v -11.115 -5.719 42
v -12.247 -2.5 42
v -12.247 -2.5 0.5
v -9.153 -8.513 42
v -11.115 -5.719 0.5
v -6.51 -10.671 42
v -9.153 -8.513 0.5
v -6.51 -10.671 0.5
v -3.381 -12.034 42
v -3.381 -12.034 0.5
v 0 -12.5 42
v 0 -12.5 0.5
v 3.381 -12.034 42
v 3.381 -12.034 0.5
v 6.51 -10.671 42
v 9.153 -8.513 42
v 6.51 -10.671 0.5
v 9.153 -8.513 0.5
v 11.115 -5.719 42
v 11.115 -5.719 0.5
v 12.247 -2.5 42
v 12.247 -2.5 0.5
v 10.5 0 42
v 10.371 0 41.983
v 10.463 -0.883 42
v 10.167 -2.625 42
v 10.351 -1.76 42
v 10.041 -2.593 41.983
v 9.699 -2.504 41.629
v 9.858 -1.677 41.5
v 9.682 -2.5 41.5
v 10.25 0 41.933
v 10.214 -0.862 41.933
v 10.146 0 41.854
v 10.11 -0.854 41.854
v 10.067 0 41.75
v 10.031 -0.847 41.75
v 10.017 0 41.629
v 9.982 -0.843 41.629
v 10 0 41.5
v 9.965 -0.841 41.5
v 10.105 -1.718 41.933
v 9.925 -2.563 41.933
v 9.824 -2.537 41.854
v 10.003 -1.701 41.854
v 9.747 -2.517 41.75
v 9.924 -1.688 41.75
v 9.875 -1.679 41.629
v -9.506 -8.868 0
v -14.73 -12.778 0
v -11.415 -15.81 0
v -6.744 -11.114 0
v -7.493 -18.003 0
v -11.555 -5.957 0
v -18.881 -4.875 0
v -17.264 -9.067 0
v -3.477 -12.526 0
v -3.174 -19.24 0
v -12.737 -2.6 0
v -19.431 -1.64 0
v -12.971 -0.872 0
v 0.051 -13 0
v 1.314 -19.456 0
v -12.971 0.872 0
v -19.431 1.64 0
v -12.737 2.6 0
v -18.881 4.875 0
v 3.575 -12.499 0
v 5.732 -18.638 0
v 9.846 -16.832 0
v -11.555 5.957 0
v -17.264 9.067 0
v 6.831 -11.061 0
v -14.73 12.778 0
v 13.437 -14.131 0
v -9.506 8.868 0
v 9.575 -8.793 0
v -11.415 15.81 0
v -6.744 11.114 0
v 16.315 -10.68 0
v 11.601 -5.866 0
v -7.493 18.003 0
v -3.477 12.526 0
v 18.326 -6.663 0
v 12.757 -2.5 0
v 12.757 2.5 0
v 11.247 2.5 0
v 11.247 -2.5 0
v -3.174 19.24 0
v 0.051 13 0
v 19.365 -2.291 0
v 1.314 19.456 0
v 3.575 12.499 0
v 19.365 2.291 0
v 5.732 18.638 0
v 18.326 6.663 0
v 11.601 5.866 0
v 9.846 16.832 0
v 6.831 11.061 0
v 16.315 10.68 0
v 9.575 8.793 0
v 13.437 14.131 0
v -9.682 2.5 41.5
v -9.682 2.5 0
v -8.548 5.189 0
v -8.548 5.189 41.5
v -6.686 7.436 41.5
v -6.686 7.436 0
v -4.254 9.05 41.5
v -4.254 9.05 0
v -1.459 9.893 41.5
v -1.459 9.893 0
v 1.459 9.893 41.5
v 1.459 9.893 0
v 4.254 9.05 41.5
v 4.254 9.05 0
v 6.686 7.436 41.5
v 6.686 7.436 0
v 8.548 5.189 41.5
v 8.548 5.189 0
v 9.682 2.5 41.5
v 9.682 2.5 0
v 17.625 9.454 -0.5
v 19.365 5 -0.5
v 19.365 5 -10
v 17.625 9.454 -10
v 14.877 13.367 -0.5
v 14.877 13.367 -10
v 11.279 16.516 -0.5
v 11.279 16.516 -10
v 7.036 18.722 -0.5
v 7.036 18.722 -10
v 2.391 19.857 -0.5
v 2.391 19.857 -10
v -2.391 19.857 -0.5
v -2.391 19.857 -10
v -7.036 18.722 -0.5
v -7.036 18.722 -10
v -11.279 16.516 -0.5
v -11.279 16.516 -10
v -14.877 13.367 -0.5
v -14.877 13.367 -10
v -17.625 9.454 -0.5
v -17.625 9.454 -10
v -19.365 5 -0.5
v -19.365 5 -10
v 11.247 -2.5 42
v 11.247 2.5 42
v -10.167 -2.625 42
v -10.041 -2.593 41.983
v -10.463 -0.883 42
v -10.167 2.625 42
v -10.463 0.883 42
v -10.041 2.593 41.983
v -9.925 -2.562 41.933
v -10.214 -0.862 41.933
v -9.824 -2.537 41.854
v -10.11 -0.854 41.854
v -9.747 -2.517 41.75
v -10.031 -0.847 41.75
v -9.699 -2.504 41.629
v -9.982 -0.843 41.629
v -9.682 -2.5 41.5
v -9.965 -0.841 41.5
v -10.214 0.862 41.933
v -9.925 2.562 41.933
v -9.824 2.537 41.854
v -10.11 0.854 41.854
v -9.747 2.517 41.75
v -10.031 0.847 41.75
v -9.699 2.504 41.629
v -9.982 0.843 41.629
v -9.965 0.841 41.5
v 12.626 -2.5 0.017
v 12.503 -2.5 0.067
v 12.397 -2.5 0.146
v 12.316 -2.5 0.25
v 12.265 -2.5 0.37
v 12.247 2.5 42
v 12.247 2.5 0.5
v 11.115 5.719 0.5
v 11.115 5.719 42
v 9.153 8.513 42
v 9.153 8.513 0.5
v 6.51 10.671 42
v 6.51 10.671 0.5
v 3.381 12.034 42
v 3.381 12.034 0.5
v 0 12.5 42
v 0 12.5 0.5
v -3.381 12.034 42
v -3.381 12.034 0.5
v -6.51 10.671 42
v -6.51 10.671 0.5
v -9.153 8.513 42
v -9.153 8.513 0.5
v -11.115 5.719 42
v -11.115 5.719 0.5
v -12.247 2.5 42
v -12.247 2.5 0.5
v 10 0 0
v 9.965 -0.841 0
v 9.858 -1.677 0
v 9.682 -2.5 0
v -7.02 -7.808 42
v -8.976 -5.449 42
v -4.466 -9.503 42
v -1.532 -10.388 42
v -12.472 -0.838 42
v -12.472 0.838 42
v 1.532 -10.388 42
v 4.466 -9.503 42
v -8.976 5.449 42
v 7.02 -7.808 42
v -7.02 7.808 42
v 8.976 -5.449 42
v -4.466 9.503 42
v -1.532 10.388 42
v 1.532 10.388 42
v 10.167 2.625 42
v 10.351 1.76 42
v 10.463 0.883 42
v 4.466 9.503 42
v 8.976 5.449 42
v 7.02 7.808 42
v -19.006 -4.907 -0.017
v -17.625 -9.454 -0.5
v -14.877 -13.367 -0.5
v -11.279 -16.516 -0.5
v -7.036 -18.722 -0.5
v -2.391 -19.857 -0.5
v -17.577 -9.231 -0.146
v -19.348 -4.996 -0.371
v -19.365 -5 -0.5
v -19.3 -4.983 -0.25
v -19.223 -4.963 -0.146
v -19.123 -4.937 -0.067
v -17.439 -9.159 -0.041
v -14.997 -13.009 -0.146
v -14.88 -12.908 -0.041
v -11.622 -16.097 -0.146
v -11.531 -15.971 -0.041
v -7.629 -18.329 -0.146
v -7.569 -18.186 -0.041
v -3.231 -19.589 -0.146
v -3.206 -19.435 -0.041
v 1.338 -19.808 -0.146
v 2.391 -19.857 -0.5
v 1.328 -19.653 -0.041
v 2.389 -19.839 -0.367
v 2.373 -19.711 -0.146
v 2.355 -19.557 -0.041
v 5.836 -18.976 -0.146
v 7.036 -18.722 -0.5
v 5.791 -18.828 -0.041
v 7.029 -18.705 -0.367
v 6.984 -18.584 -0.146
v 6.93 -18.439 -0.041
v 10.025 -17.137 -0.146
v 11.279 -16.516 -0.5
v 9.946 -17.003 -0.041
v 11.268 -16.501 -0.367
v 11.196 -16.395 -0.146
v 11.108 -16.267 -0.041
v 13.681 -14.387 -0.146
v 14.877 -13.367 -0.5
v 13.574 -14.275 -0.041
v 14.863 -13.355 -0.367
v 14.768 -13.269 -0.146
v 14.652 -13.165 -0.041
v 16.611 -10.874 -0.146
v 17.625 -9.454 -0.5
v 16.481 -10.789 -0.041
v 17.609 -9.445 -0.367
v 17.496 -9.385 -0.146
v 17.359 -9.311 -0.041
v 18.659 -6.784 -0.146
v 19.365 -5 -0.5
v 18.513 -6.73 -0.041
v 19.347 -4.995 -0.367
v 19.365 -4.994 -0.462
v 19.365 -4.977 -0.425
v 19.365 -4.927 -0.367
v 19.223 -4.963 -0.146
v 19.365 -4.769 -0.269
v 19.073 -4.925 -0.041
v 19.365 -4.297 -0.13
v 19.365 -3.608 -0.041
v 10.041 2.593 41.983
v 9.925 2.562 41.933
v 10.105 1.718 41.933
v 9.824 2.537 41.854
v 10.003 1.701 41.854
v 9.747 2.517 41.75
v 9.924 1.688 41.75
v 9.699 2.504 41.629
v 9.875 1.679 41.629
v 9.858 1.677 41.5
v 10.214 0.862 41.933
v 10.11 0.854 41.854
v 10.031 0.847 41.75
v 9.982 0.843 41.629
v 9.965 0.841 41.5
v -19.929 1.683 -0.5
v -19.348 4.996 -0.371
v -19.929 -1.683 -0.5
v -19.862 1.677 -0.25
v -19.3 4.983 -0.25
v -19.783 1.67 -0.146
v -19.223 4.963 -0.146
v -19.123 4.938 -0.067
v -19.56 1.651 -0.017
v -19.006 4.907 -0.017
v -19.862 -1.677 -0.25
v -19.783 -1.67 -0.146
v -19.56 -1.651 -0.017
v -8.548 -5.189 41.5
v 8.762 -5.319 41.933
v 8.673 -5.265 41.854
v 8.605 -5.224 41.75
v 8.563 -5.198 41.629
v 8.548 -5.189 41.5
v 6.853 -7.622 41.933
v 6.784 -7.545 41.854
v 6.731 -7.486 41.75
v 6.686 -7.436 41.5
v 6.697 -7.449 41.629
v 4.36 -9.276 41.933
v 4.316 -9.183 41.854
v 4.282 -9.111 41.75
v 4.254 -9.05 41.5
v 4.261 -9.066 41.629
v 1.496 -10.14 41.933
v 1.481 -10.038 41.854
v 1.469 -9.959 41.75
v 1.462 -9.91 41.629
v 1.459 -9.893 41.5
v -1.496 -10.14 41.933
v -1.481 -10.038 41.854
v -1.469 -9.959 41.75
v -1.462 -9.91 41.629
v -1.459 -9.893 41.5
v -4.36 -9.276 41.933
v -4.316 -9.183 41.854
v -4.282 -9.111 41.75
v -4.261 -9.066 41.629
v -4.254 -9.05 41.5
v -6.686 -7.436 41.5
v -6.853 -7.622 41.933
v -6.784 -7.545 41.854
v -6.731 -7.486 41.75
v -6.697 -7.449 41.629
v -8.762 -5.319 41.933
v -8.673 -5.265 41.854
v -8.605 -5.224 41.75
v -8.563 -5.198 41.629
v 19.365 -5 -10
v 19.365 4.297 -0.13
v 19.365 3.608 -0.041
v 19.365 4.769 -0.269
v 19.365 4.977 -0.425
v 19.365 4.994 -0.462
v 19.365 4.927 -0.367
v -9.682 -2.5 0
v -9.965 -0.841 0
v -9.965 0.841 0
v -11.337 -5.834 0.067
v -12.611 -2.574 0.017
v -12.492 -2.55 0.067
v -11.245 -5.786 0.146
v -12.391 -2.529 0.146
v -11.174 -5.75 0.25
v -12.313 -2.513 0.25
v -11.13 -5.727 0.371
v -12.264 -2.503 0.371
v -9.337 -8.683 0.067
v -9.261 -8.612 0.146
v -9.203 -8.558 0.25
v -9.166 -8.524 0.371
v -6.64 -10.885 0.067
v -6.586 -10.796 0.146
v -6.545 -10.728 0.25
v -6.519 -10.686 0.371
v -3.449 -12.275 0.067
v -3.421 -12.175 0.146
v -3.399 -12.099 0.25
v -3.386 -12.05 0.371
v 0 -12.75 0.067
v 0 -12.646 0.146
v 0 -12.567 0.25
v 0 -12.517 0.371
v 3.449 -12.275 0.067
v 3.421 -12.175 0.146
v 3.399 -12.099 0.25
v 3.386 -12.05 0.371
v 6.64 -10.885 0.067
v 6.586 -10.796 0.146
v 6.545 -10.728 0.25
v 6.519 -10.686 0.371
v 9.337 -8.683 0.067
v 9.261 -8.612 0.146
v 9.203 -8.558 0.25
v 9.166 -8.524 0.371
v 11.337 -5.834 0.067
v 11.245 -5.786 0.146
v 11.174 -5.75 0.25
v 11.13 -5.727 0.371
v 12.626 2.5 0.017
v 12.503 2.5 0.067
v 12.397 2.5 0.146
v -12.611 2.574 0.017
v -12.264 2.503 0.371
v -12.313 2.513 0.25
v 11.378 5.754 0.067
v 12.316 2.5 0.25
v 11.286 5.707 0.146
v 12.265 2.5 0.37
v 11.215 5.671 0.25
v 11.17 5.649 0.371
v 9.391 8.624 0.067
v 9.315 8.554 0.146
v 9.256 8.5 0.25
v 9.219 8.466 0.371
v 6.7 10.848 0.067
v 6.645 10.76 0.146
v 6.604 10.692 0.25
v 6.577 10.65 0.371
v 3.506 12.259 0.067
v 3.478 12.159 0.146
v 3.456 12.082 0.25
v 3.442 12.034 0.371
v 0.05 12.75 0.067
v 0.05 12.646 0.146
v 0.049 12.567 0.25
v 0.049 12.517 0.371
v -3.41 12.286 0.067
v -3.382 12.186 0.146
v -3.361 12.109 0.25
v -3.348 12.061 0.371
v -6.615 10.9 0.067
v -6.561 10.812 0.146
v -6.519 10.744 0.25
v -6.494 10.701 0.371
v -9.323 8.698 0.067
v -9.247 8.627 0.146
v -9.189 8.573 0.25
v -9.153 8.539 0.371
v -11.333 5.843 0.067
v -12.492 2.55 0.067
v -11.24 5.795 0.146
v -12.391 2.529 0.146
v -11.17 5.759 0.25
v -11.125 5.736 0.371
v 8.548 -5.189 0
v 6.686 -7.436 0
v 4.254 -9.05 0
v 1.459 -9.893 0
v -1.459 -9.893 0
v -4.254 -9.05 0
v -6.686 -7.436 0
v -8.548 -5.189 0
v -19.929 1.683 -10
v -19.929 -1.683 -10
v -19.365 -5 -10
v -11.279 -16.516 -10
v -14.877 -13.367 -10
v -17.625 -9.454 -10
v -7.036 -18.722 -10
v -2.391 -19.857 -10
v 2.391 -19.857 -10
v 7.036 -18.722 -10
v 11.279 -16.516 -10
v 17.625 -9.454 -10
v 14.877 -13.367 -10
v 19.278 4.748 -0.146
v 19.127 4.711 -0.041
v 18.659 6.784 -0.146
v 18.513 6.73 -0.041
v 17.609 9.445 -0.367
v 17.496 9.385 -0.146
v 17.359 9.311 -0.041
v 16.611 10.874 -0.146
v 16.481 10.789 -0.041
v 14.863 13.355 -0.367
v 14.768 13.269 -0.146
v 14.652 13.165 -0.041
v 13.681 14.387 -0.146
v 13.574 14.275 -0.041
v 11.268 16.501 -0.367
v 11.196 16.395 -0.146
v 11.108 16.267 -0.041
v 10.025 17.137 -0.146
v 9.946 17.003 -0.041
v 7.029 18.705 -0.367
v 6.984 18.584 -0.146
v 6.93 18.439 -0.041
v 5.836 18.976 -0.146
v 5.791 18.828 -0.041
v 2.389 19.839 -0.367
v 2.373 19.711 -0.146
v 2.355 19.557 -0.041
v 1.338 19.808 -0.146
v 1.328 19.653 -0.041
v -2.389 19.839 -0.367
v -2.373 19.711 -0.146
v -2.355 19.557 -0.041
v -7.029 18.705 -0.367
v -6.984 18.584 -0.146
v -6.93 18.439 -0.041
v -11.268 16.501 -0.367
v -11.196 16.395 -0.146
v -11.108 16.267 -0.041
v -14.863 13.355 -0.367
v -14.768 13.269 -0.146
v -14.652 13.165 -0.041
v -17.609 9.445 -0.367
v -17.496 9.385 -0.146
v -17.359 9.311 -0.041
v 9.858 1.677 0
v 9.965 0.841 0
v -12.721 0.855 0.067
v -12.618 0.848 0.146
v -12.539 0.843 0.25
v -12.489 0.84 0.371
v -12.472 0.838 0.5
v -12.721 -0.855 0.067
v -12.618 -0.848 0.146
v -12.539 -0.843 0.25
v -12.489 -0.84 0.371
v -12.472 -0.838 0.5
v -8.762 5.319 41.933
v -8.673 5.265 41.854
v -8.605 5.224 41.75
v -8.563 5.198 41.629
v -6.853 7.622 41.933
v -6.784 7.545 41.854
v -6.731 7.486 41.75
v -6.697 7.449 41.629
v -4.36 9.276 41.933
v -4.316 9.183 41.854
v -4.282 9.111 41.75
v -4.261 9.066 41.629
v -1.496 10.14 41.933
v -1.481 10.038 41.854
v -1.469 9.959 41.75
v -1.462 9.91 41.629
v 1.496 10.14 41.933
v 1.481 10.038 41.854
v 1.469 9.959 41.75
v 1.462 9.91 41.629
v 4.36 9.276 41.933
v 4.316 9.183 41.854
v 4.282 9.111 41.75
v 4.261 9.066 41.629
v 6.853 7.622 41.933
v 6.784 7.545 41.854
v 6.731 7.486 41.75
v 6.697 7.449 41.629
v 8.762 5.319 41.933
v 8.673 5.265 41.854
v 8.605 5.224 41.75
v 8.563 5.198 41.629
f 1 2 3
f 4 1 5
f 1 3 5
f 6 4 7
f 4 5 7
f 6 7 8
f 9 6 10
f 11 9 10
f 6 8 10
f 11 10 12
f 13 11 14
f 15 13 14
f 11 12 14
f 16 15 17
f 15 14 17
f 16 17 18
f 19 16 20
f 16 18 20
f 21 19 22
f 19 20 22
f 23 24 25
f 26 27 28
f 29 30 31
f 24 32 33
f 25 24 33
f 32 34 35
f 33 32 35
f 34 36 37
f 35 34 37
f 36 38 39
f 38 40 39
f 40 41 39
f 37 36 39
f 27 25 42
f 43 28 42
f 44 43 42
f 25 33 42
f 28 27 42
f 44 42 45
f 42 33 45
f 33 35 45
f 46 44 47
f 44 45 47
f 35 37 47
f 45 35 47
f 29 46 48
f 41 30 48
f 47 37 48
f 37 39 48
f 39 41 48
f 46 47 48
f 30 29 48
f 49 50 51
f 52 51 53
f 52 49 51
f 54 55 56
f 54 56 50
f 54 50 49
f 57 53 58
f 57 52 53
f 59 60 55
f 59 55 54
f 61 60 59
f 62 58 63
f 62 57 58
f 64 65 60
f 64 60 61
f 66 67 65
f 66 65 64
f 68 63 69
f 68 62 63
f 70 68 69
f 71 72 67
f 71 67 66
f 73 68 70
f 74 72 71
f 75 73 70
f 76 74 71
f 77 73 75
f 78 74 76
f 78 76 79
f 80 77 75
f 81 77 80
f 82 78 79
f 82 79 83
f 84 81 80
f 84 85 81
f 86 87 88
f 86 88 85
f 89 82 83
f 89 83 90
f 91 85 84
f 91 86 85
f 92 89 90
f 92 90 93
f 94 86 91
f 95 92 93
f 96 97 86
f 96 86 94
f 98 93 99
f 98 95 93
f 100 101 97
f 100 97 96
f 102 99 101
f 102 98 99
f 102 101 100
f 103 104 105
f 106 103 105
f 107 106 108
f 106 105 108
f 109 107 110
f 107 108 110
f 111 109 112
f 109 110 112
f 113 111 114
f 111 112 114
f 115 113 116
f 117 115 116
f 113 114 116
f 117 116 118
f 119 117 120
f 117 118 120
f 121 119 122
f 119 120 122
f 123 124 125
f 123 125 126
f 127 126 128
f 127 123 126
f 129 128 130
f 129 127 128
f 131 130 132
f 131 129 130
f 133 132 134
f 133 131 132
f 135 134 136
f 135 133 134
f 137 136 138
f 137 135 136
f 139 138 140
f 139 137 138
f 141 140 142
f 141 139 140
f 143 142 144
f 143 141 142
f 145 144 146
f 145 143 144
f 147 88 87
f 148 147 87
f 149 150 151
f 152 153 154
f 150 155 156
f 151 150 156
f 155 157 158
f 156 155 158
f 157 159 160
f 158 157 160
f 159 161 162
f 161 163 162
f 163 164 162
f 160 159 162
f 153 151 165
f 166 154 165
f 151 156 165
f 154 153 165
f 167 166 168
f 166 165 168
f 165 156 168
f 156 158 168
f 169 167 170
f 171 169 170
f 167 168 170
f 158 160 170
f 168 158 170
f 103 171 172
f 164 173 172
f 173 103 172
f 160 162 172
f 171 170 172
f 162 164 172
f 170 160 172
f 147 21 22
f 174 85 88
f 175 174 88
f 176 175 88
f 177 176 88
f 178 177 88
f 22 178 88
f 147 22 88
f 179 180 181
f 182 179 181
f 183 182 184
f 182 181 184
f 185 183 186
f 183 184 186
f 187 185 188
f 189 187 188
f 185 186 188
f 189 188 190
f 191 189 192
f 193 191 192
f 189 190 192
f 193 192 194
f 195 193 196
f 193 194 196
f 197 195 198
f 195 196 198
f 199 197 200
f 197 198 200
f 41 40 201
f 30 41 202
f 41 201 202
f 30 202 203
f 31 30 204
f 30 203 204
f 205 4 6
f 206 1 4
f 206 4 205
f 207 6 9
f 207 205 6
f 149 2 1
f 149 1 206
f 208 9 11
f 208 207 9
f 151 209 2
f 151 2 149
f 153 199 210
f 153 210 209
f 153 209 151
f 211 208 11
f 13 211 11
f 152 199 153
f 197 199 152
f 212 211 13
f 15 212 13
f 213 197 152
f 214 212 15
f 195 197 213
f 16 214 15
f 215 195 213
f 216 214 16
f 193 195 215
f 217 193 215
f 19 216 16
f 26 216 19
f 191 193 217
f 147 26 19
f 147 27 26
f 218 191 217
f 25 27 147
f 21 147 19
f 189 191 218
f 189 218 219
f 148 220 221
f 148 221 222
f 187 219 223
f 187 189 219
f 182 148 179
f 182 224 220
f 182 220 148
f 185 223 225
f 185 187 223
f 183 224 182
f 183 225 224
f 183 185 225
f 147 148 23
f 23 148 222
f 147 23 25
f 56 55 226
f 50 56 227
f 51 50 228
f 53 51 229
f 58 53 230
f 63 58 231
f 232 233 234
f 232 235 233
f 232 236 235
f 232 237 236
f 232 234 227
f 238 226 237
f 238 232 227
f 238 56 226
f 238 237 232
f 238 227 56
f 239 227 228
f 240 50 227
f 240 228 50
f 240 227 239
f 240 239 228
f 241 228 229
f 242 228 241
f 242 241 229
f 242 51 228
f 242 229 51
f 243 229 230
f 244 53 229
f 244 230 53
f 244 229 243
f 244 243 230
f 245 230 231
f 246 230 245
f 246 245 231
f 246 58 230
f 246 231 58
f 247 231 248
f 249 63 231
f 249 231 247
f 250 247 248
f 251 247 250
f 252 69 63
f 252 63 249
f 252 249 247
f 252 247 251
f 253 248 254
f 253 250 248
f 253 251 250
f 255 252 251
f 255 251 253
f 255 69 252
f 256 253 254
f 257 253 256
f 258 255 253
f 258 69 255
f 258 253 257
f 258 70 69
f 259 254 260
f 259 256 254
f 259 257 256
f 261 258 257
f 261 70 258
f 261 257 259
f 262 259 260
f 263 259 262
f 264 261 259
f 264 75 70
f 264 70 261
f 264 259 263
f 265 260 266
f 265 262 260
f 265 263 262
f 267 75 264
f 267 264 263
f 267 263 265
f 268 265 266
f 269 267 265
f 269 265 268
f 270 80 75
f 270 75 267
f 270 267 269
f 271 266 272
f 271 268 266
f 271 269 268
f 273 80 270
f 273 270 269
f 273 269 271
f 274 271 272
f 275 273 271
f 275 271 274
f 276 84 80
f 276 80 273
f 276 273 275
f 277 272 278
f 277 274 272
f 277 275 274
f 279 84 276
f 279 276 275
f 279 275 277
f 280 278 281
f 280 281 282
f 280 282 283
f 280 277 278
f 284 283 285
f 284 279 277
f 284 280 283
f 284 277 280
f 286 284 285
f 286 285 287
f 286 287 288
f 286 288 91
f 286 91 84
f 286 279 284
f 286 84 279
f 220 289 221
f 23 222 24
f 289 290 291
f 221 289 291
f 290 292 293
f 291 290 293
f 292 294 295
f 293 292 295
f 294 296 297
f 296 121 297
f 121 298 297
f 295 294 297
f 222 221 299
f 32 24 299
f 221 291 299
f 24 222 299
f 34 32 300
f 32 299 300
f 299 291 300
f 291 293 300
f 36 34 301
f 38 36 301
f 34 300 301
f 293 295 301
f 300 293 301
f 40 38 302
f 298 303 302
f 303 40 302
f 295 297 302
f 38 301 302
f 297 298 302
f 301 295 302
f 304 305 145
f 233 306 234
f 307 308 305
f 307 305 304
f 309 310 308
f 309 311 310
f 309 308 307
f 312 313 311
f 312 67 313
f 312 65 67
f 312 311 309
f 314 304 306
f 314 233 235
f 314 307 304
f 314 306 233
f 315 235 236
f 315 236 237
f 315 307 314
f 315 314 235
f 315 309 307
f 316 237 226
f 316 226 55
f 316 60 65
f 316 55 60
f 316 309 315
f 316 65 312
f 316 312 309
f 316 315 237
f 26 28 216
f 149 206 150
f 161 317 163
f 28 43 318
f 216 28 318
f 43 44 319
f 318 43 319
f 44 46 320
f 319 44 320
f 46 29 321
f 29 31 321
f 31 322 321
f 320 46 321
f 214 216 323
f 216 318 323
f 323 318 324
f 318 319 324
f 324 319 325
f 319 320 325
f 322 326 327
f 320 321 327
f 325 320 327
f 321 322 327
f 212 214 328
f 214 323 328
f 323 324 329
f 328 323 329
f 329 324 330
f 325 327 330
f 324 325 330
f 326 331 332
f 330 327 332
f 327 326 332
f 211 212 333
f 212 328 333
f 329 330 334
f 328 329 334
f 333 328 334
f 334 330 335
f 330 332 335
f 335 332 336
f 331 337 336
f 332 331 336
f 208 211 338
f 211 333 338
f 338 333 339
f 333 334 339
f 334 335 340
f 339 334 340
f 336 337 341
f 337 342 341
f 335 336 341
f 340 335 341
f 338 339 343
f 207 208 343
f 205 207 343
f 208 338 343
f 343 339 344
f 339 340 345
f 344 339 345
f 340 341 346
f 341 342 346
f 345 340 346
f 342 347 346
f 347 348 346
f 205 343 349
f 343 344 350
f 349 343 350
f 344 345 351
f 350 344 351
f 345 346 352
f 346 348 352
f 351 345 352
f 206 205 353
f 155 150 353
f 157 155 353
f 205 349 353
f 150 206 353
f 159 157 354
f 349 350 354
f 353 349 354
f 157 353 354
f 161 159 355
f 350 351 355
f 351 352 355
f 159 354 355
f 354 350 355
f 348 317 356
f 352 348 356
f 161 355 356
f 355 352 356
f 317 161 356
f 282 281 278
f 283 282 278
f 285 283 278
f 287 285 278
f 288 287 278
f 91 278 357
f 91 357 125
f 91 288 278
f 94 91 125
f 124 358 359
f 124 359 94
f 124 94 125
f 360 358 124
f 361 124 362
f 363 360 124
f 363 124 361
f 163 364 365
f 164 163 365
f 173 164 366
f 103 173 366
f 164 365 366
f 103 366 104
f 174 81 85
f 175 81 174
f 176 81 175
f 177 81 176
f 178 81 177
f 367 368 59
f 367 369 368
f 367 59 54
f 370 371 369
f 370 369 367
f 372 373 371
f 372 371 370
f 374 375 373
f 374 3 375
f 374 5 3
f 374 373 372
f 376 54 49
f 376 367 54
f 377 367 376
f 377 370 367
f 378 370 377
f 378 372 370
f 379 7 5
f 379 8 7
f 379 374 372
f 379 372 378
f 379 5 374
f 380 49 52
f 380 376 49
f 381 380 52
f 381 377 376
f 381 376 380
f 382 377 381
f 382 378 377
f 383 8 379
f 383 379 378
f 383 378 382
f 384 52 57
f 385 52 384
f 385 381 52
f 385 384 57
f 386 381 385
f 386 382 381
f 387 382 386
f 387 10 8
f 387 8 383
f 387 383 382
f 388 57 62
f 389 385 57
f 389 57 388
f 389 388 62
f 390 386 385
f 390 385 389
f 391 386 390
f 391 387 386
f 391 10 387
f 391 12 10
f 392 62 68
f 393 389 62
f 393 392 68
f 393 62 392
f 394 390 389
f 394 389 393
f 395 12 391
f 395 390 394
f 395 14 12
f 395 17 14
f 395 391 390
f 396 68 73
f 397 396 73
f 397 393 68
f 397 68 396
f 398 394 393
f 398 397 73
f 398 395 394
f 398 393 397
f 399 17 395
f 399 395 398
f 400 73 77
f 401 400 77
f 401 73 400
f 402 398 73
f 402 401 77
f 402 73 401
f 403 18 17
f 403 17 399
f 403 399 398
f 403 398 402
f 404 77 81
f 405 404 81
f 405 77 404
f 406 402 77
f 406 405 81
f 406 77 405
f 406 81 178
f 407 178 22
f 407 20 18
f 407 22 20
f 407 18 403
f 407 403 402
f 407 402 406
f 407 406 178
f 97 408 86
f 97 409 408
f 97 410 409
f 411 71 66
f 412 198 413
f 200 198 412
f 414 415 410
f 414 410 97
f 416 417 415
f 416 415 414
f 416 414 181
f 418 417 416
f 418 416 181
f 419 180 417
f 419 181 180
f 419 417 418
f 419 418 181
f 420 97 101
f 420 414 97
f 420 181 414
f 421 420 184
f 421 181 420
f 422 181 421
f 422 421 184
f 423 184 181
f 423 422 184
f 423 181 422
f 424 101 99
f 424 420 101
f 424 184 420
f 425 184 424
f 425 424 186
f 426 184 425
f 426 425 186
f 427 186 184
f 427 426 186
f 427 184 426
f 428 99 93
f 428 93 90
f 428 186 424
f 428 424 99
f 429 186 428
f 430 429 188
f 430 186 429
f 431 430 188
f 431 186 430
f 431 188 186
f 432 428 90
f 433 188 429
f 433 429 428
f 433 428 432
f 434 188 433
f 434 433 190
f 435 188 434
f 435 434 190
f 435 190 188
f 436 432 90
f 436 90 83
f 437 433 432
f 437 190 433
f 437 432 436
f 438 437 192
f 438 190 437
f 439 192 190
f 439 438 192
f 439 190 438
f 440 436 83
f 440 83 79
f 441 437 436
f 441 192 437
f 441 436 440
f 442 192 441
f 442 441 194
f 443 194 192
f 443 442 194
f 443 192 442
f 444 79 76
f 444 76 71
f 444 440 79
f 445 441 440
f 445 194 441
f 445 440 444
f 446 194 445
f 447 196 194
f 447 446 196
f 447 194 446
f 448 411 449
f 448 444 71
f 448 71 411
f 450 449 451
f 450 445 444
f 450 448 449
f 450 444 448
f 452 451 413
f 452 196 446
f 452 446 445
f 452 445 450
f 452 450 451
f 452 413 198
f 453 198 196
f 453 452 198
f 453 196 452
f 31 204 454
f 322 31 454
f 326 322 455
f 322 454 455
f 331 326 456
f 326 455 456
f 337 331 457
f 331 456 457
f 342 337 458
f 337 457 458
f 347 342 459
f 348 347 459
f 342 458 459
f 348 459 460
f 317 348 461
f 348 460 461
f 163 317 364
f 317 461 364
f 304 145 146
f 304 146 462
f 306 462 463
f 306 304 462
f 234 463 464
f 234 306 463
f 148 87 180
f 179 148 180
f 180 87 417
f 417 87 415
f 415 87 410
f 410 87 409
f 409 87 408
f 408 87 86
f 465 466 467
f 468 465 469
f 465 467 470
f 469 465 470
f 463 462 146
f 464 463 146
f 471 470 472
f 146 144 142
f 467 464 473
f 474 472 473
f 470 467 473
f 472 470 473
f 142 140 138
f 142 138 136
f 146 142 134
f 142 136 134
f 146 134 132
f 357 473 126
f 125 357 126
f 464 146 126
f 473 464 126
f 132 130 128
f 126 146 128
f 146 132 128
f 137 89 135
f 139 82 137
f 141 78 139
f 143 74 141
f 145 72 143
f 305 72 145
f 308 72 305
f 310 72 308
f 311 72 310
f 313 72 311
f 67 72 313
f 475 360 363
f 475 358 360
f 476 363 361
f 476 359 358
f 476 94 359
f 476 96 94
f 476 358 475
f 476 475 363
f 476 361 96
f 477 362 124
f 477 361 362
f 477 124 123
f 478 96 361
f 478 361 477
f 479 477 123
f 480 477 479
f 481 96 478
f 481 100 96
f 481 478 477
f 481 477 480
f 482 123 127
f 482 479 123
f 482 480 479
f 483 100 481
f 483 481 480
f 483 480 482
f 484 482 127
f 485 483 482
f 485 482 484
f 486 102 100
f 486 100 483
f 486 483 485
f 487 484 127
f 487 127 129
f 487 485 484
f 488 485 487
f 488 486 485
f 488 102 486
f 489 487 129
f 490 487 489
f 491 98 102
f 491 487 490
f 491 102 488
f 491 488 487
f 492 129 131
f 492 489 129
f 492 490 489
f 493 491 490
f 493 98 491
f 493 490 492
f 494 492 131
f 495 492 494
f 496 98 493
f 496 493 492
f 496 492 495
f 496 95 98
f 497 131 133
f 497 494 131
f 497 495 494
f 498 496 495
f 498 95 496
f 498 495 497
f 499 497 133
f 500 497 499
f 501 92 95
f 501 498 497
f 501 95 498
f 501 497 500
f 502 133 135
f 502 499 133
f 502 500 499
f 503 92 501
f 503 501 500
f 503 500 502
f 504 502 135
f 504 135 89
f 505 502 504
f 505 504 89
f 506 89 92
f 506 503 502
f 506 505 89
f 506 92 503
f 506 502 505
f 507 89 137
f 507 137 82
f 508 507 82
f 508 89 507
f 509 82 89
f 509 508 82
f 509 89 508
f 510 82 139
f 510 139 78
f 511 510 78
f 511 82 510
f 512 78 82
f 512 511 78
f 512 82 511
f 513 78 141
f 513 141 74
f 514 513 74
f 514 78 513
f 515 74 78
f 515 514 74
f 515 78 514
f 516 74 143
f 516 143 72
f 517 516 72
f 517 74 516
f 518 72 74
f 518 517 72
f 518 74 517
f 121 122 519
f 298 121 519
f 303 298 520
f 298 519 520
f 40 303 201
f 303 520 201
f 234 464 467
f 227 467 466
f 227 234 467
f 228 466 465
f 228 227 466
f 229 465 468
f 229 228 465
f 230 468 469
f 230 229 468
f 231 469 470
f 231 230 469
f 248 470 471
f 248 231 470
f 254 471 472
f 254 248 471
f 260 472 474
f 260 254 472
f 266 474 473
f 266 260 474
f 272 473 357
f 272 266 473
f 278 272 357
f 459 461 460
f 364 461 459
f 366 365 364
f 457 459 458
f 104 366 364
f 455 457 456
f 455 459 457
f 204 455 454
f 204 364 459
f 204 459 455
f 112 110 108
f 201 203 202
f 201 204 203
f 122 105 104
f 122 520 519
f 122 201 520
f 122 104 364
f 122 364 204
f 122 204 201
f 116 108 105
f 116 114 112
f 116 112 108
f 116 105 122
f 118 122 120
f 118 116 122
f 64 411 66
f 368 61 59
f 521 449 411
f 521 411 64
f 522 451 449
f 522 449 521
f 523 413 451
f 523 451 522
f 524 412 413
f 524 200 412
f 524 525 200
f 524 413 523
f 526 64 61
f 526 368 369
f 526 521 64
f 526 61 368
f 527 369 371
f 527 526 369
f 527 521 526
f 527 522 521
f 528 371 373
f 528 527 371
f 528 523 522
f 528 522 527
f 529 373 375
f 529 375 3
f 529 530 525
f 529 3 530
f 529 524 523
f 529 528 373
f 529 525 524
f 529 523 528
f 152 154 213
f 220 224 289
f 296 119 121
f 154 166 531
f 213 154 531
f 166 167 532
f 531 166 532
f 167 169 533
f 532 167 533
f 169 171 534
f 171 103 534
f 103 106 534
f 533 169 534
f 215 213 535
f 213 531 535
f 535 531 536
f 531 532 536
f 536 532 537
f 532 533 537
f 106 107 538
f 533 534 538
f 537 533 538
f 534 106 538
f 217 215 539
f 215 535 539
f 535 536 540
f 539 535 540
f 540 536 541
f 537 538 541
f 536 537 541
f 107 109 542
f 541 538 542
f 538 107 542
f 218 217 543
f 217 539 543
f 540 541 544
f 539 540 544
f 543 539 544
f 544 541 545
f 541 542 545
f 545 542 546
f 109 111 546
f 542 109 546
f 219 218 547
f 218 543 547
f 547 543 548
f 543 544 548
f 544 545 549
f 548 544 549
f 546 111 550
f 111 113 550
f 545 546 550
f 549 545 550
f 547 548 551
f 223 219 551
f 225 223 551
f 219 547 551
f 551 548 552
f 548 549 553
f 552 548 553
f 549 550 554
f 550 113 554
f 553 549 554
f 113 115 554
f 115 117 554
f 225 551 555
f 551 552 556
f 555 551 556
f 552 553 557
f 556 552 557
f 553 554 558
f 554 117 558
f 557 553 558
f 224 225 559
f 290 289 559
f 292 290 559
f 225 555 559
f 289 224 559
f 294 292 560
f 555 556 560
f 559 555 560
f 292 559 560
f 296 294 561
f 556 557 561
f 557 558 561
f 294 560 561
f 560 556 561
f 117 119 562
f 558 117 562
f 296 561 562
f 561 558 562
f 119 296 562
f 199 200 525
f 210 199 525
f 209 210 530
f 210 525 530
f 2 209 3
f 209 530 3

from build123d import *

# Parameters (mm, degrees)
F0_W     = 38.7298334621
F0_H     = 10
F1_DEPTH = 10
F3_DEPTH = 42
F4_R     = 0.5


with BuildPart() as f1:
    # F0 (on Top) → F1 (new body)
    with BuildSketch(Plane.XY):
        with BuildLine():
            Line((-19.364916731, 5), (19.364916731, 5))
            ThreePointArc((19.364916731, 5), (0, 20), (-19.364916731, 5))
        make_face()
        with BuildLine():
            Line((-19.364916731, -5), (-19.364916731, 5))
            ThreePointArc((-19.364916731, 5), (-20, 0), (-19.364916731, -5))
        make_face()
        with BuildLine():
            ThreePointArc((-19.364916731, -5), (0, -20), (19.364916731, -5))
            Line((19.364916731, -5), (-19.364916731, -5))
        make_face()
        Rectangle(F0_W, F0_H)
    extrude(amount=-F1_DEPTH)

    # F2 (on face) → F3 (join)
    with BuildSketch(Plane.XY):
        with BuildLine():
            Line((11.2474487139, 2.5), (12.2474487139, 2.5))
            ThreePointArc((12.2474487139, 2.5), (0, 12.5), (-12.2474487139, 2.5))
            Line((-12.2474487139, 2.5), (-9.6824583655, 2.5))
            ThreePointArc((-9.6824583655, 2.5), (0, 10), (9.6824583655, 2.5))
            Line((9.6824583655, 2.5), (11.2474487139, 2.5))
        make_face()
        with BuildLine():
            Line((11.2474487139, -2.5), (11.2474487139, 2.5))
            Line((11.2474487139, 2.5), (9.6824583655, 2.5))
            ThreePointArc((9.6824583655, 2.5), (9.9202969627, 1.2600429248), (10, 0))
            ThreePointArc((10, 0), (9.9202969627, -1.2600429248), (9.6824583655, -2.5))
            Line((9.6824583655, -2.5), (11.2474487139, -2.5))
        make_face()
        with BuildLine():
            ThreePointArc((-12.2474487139, -2.5), (0, -12.5), (12.2474487139, -2.5))
            Line((12.2474487139, -2.5), (11.2474487139, -2.5))
            Line((11.2474487139, -2.5), (9.6824583655, -2.5))
            ThreePointArc((9.6824583655, -2.5), (0, -10), (-9.6824583655, -2.5))
            Line((-9.6824583655, -2.5), (-12.2474487139, -2.5))
        make_face()
        with BuildLine():
            Line((-9.6824583655, 2.5), (-12.2474487139, 2.5))
            Line((-12.2474487139, 2.5), (-12.2474487139, -2.5))
            Line((-12.2474487139, -2.5), (-9.6824583655, -2.5))
            ThreePointArc((-9.6824583655, -2.5), (-10, 0), (-9.6824583655, 2.5))
        make_face()
        with BuildLine():
            Line((-12.2474487139, -2.5), (-12.2474487139, 2.5))
            ThreePointArc((-12.2474487139, 2.5), (-12.5, 0), (-12.2474487139, -2.5))
        make_face()
    extrude(amount=F3_DEPTH)

    # F4
    f4_edges = [f1.edges().sort_by_distance(p)[0] for p in [
        (9.682458, 2.5, 42),
        (-12.5, 0, 0),
        (-20, 0, 0),
    ]]
    fillet(f4_edges, radius=F4_R)


solid = f1.part
